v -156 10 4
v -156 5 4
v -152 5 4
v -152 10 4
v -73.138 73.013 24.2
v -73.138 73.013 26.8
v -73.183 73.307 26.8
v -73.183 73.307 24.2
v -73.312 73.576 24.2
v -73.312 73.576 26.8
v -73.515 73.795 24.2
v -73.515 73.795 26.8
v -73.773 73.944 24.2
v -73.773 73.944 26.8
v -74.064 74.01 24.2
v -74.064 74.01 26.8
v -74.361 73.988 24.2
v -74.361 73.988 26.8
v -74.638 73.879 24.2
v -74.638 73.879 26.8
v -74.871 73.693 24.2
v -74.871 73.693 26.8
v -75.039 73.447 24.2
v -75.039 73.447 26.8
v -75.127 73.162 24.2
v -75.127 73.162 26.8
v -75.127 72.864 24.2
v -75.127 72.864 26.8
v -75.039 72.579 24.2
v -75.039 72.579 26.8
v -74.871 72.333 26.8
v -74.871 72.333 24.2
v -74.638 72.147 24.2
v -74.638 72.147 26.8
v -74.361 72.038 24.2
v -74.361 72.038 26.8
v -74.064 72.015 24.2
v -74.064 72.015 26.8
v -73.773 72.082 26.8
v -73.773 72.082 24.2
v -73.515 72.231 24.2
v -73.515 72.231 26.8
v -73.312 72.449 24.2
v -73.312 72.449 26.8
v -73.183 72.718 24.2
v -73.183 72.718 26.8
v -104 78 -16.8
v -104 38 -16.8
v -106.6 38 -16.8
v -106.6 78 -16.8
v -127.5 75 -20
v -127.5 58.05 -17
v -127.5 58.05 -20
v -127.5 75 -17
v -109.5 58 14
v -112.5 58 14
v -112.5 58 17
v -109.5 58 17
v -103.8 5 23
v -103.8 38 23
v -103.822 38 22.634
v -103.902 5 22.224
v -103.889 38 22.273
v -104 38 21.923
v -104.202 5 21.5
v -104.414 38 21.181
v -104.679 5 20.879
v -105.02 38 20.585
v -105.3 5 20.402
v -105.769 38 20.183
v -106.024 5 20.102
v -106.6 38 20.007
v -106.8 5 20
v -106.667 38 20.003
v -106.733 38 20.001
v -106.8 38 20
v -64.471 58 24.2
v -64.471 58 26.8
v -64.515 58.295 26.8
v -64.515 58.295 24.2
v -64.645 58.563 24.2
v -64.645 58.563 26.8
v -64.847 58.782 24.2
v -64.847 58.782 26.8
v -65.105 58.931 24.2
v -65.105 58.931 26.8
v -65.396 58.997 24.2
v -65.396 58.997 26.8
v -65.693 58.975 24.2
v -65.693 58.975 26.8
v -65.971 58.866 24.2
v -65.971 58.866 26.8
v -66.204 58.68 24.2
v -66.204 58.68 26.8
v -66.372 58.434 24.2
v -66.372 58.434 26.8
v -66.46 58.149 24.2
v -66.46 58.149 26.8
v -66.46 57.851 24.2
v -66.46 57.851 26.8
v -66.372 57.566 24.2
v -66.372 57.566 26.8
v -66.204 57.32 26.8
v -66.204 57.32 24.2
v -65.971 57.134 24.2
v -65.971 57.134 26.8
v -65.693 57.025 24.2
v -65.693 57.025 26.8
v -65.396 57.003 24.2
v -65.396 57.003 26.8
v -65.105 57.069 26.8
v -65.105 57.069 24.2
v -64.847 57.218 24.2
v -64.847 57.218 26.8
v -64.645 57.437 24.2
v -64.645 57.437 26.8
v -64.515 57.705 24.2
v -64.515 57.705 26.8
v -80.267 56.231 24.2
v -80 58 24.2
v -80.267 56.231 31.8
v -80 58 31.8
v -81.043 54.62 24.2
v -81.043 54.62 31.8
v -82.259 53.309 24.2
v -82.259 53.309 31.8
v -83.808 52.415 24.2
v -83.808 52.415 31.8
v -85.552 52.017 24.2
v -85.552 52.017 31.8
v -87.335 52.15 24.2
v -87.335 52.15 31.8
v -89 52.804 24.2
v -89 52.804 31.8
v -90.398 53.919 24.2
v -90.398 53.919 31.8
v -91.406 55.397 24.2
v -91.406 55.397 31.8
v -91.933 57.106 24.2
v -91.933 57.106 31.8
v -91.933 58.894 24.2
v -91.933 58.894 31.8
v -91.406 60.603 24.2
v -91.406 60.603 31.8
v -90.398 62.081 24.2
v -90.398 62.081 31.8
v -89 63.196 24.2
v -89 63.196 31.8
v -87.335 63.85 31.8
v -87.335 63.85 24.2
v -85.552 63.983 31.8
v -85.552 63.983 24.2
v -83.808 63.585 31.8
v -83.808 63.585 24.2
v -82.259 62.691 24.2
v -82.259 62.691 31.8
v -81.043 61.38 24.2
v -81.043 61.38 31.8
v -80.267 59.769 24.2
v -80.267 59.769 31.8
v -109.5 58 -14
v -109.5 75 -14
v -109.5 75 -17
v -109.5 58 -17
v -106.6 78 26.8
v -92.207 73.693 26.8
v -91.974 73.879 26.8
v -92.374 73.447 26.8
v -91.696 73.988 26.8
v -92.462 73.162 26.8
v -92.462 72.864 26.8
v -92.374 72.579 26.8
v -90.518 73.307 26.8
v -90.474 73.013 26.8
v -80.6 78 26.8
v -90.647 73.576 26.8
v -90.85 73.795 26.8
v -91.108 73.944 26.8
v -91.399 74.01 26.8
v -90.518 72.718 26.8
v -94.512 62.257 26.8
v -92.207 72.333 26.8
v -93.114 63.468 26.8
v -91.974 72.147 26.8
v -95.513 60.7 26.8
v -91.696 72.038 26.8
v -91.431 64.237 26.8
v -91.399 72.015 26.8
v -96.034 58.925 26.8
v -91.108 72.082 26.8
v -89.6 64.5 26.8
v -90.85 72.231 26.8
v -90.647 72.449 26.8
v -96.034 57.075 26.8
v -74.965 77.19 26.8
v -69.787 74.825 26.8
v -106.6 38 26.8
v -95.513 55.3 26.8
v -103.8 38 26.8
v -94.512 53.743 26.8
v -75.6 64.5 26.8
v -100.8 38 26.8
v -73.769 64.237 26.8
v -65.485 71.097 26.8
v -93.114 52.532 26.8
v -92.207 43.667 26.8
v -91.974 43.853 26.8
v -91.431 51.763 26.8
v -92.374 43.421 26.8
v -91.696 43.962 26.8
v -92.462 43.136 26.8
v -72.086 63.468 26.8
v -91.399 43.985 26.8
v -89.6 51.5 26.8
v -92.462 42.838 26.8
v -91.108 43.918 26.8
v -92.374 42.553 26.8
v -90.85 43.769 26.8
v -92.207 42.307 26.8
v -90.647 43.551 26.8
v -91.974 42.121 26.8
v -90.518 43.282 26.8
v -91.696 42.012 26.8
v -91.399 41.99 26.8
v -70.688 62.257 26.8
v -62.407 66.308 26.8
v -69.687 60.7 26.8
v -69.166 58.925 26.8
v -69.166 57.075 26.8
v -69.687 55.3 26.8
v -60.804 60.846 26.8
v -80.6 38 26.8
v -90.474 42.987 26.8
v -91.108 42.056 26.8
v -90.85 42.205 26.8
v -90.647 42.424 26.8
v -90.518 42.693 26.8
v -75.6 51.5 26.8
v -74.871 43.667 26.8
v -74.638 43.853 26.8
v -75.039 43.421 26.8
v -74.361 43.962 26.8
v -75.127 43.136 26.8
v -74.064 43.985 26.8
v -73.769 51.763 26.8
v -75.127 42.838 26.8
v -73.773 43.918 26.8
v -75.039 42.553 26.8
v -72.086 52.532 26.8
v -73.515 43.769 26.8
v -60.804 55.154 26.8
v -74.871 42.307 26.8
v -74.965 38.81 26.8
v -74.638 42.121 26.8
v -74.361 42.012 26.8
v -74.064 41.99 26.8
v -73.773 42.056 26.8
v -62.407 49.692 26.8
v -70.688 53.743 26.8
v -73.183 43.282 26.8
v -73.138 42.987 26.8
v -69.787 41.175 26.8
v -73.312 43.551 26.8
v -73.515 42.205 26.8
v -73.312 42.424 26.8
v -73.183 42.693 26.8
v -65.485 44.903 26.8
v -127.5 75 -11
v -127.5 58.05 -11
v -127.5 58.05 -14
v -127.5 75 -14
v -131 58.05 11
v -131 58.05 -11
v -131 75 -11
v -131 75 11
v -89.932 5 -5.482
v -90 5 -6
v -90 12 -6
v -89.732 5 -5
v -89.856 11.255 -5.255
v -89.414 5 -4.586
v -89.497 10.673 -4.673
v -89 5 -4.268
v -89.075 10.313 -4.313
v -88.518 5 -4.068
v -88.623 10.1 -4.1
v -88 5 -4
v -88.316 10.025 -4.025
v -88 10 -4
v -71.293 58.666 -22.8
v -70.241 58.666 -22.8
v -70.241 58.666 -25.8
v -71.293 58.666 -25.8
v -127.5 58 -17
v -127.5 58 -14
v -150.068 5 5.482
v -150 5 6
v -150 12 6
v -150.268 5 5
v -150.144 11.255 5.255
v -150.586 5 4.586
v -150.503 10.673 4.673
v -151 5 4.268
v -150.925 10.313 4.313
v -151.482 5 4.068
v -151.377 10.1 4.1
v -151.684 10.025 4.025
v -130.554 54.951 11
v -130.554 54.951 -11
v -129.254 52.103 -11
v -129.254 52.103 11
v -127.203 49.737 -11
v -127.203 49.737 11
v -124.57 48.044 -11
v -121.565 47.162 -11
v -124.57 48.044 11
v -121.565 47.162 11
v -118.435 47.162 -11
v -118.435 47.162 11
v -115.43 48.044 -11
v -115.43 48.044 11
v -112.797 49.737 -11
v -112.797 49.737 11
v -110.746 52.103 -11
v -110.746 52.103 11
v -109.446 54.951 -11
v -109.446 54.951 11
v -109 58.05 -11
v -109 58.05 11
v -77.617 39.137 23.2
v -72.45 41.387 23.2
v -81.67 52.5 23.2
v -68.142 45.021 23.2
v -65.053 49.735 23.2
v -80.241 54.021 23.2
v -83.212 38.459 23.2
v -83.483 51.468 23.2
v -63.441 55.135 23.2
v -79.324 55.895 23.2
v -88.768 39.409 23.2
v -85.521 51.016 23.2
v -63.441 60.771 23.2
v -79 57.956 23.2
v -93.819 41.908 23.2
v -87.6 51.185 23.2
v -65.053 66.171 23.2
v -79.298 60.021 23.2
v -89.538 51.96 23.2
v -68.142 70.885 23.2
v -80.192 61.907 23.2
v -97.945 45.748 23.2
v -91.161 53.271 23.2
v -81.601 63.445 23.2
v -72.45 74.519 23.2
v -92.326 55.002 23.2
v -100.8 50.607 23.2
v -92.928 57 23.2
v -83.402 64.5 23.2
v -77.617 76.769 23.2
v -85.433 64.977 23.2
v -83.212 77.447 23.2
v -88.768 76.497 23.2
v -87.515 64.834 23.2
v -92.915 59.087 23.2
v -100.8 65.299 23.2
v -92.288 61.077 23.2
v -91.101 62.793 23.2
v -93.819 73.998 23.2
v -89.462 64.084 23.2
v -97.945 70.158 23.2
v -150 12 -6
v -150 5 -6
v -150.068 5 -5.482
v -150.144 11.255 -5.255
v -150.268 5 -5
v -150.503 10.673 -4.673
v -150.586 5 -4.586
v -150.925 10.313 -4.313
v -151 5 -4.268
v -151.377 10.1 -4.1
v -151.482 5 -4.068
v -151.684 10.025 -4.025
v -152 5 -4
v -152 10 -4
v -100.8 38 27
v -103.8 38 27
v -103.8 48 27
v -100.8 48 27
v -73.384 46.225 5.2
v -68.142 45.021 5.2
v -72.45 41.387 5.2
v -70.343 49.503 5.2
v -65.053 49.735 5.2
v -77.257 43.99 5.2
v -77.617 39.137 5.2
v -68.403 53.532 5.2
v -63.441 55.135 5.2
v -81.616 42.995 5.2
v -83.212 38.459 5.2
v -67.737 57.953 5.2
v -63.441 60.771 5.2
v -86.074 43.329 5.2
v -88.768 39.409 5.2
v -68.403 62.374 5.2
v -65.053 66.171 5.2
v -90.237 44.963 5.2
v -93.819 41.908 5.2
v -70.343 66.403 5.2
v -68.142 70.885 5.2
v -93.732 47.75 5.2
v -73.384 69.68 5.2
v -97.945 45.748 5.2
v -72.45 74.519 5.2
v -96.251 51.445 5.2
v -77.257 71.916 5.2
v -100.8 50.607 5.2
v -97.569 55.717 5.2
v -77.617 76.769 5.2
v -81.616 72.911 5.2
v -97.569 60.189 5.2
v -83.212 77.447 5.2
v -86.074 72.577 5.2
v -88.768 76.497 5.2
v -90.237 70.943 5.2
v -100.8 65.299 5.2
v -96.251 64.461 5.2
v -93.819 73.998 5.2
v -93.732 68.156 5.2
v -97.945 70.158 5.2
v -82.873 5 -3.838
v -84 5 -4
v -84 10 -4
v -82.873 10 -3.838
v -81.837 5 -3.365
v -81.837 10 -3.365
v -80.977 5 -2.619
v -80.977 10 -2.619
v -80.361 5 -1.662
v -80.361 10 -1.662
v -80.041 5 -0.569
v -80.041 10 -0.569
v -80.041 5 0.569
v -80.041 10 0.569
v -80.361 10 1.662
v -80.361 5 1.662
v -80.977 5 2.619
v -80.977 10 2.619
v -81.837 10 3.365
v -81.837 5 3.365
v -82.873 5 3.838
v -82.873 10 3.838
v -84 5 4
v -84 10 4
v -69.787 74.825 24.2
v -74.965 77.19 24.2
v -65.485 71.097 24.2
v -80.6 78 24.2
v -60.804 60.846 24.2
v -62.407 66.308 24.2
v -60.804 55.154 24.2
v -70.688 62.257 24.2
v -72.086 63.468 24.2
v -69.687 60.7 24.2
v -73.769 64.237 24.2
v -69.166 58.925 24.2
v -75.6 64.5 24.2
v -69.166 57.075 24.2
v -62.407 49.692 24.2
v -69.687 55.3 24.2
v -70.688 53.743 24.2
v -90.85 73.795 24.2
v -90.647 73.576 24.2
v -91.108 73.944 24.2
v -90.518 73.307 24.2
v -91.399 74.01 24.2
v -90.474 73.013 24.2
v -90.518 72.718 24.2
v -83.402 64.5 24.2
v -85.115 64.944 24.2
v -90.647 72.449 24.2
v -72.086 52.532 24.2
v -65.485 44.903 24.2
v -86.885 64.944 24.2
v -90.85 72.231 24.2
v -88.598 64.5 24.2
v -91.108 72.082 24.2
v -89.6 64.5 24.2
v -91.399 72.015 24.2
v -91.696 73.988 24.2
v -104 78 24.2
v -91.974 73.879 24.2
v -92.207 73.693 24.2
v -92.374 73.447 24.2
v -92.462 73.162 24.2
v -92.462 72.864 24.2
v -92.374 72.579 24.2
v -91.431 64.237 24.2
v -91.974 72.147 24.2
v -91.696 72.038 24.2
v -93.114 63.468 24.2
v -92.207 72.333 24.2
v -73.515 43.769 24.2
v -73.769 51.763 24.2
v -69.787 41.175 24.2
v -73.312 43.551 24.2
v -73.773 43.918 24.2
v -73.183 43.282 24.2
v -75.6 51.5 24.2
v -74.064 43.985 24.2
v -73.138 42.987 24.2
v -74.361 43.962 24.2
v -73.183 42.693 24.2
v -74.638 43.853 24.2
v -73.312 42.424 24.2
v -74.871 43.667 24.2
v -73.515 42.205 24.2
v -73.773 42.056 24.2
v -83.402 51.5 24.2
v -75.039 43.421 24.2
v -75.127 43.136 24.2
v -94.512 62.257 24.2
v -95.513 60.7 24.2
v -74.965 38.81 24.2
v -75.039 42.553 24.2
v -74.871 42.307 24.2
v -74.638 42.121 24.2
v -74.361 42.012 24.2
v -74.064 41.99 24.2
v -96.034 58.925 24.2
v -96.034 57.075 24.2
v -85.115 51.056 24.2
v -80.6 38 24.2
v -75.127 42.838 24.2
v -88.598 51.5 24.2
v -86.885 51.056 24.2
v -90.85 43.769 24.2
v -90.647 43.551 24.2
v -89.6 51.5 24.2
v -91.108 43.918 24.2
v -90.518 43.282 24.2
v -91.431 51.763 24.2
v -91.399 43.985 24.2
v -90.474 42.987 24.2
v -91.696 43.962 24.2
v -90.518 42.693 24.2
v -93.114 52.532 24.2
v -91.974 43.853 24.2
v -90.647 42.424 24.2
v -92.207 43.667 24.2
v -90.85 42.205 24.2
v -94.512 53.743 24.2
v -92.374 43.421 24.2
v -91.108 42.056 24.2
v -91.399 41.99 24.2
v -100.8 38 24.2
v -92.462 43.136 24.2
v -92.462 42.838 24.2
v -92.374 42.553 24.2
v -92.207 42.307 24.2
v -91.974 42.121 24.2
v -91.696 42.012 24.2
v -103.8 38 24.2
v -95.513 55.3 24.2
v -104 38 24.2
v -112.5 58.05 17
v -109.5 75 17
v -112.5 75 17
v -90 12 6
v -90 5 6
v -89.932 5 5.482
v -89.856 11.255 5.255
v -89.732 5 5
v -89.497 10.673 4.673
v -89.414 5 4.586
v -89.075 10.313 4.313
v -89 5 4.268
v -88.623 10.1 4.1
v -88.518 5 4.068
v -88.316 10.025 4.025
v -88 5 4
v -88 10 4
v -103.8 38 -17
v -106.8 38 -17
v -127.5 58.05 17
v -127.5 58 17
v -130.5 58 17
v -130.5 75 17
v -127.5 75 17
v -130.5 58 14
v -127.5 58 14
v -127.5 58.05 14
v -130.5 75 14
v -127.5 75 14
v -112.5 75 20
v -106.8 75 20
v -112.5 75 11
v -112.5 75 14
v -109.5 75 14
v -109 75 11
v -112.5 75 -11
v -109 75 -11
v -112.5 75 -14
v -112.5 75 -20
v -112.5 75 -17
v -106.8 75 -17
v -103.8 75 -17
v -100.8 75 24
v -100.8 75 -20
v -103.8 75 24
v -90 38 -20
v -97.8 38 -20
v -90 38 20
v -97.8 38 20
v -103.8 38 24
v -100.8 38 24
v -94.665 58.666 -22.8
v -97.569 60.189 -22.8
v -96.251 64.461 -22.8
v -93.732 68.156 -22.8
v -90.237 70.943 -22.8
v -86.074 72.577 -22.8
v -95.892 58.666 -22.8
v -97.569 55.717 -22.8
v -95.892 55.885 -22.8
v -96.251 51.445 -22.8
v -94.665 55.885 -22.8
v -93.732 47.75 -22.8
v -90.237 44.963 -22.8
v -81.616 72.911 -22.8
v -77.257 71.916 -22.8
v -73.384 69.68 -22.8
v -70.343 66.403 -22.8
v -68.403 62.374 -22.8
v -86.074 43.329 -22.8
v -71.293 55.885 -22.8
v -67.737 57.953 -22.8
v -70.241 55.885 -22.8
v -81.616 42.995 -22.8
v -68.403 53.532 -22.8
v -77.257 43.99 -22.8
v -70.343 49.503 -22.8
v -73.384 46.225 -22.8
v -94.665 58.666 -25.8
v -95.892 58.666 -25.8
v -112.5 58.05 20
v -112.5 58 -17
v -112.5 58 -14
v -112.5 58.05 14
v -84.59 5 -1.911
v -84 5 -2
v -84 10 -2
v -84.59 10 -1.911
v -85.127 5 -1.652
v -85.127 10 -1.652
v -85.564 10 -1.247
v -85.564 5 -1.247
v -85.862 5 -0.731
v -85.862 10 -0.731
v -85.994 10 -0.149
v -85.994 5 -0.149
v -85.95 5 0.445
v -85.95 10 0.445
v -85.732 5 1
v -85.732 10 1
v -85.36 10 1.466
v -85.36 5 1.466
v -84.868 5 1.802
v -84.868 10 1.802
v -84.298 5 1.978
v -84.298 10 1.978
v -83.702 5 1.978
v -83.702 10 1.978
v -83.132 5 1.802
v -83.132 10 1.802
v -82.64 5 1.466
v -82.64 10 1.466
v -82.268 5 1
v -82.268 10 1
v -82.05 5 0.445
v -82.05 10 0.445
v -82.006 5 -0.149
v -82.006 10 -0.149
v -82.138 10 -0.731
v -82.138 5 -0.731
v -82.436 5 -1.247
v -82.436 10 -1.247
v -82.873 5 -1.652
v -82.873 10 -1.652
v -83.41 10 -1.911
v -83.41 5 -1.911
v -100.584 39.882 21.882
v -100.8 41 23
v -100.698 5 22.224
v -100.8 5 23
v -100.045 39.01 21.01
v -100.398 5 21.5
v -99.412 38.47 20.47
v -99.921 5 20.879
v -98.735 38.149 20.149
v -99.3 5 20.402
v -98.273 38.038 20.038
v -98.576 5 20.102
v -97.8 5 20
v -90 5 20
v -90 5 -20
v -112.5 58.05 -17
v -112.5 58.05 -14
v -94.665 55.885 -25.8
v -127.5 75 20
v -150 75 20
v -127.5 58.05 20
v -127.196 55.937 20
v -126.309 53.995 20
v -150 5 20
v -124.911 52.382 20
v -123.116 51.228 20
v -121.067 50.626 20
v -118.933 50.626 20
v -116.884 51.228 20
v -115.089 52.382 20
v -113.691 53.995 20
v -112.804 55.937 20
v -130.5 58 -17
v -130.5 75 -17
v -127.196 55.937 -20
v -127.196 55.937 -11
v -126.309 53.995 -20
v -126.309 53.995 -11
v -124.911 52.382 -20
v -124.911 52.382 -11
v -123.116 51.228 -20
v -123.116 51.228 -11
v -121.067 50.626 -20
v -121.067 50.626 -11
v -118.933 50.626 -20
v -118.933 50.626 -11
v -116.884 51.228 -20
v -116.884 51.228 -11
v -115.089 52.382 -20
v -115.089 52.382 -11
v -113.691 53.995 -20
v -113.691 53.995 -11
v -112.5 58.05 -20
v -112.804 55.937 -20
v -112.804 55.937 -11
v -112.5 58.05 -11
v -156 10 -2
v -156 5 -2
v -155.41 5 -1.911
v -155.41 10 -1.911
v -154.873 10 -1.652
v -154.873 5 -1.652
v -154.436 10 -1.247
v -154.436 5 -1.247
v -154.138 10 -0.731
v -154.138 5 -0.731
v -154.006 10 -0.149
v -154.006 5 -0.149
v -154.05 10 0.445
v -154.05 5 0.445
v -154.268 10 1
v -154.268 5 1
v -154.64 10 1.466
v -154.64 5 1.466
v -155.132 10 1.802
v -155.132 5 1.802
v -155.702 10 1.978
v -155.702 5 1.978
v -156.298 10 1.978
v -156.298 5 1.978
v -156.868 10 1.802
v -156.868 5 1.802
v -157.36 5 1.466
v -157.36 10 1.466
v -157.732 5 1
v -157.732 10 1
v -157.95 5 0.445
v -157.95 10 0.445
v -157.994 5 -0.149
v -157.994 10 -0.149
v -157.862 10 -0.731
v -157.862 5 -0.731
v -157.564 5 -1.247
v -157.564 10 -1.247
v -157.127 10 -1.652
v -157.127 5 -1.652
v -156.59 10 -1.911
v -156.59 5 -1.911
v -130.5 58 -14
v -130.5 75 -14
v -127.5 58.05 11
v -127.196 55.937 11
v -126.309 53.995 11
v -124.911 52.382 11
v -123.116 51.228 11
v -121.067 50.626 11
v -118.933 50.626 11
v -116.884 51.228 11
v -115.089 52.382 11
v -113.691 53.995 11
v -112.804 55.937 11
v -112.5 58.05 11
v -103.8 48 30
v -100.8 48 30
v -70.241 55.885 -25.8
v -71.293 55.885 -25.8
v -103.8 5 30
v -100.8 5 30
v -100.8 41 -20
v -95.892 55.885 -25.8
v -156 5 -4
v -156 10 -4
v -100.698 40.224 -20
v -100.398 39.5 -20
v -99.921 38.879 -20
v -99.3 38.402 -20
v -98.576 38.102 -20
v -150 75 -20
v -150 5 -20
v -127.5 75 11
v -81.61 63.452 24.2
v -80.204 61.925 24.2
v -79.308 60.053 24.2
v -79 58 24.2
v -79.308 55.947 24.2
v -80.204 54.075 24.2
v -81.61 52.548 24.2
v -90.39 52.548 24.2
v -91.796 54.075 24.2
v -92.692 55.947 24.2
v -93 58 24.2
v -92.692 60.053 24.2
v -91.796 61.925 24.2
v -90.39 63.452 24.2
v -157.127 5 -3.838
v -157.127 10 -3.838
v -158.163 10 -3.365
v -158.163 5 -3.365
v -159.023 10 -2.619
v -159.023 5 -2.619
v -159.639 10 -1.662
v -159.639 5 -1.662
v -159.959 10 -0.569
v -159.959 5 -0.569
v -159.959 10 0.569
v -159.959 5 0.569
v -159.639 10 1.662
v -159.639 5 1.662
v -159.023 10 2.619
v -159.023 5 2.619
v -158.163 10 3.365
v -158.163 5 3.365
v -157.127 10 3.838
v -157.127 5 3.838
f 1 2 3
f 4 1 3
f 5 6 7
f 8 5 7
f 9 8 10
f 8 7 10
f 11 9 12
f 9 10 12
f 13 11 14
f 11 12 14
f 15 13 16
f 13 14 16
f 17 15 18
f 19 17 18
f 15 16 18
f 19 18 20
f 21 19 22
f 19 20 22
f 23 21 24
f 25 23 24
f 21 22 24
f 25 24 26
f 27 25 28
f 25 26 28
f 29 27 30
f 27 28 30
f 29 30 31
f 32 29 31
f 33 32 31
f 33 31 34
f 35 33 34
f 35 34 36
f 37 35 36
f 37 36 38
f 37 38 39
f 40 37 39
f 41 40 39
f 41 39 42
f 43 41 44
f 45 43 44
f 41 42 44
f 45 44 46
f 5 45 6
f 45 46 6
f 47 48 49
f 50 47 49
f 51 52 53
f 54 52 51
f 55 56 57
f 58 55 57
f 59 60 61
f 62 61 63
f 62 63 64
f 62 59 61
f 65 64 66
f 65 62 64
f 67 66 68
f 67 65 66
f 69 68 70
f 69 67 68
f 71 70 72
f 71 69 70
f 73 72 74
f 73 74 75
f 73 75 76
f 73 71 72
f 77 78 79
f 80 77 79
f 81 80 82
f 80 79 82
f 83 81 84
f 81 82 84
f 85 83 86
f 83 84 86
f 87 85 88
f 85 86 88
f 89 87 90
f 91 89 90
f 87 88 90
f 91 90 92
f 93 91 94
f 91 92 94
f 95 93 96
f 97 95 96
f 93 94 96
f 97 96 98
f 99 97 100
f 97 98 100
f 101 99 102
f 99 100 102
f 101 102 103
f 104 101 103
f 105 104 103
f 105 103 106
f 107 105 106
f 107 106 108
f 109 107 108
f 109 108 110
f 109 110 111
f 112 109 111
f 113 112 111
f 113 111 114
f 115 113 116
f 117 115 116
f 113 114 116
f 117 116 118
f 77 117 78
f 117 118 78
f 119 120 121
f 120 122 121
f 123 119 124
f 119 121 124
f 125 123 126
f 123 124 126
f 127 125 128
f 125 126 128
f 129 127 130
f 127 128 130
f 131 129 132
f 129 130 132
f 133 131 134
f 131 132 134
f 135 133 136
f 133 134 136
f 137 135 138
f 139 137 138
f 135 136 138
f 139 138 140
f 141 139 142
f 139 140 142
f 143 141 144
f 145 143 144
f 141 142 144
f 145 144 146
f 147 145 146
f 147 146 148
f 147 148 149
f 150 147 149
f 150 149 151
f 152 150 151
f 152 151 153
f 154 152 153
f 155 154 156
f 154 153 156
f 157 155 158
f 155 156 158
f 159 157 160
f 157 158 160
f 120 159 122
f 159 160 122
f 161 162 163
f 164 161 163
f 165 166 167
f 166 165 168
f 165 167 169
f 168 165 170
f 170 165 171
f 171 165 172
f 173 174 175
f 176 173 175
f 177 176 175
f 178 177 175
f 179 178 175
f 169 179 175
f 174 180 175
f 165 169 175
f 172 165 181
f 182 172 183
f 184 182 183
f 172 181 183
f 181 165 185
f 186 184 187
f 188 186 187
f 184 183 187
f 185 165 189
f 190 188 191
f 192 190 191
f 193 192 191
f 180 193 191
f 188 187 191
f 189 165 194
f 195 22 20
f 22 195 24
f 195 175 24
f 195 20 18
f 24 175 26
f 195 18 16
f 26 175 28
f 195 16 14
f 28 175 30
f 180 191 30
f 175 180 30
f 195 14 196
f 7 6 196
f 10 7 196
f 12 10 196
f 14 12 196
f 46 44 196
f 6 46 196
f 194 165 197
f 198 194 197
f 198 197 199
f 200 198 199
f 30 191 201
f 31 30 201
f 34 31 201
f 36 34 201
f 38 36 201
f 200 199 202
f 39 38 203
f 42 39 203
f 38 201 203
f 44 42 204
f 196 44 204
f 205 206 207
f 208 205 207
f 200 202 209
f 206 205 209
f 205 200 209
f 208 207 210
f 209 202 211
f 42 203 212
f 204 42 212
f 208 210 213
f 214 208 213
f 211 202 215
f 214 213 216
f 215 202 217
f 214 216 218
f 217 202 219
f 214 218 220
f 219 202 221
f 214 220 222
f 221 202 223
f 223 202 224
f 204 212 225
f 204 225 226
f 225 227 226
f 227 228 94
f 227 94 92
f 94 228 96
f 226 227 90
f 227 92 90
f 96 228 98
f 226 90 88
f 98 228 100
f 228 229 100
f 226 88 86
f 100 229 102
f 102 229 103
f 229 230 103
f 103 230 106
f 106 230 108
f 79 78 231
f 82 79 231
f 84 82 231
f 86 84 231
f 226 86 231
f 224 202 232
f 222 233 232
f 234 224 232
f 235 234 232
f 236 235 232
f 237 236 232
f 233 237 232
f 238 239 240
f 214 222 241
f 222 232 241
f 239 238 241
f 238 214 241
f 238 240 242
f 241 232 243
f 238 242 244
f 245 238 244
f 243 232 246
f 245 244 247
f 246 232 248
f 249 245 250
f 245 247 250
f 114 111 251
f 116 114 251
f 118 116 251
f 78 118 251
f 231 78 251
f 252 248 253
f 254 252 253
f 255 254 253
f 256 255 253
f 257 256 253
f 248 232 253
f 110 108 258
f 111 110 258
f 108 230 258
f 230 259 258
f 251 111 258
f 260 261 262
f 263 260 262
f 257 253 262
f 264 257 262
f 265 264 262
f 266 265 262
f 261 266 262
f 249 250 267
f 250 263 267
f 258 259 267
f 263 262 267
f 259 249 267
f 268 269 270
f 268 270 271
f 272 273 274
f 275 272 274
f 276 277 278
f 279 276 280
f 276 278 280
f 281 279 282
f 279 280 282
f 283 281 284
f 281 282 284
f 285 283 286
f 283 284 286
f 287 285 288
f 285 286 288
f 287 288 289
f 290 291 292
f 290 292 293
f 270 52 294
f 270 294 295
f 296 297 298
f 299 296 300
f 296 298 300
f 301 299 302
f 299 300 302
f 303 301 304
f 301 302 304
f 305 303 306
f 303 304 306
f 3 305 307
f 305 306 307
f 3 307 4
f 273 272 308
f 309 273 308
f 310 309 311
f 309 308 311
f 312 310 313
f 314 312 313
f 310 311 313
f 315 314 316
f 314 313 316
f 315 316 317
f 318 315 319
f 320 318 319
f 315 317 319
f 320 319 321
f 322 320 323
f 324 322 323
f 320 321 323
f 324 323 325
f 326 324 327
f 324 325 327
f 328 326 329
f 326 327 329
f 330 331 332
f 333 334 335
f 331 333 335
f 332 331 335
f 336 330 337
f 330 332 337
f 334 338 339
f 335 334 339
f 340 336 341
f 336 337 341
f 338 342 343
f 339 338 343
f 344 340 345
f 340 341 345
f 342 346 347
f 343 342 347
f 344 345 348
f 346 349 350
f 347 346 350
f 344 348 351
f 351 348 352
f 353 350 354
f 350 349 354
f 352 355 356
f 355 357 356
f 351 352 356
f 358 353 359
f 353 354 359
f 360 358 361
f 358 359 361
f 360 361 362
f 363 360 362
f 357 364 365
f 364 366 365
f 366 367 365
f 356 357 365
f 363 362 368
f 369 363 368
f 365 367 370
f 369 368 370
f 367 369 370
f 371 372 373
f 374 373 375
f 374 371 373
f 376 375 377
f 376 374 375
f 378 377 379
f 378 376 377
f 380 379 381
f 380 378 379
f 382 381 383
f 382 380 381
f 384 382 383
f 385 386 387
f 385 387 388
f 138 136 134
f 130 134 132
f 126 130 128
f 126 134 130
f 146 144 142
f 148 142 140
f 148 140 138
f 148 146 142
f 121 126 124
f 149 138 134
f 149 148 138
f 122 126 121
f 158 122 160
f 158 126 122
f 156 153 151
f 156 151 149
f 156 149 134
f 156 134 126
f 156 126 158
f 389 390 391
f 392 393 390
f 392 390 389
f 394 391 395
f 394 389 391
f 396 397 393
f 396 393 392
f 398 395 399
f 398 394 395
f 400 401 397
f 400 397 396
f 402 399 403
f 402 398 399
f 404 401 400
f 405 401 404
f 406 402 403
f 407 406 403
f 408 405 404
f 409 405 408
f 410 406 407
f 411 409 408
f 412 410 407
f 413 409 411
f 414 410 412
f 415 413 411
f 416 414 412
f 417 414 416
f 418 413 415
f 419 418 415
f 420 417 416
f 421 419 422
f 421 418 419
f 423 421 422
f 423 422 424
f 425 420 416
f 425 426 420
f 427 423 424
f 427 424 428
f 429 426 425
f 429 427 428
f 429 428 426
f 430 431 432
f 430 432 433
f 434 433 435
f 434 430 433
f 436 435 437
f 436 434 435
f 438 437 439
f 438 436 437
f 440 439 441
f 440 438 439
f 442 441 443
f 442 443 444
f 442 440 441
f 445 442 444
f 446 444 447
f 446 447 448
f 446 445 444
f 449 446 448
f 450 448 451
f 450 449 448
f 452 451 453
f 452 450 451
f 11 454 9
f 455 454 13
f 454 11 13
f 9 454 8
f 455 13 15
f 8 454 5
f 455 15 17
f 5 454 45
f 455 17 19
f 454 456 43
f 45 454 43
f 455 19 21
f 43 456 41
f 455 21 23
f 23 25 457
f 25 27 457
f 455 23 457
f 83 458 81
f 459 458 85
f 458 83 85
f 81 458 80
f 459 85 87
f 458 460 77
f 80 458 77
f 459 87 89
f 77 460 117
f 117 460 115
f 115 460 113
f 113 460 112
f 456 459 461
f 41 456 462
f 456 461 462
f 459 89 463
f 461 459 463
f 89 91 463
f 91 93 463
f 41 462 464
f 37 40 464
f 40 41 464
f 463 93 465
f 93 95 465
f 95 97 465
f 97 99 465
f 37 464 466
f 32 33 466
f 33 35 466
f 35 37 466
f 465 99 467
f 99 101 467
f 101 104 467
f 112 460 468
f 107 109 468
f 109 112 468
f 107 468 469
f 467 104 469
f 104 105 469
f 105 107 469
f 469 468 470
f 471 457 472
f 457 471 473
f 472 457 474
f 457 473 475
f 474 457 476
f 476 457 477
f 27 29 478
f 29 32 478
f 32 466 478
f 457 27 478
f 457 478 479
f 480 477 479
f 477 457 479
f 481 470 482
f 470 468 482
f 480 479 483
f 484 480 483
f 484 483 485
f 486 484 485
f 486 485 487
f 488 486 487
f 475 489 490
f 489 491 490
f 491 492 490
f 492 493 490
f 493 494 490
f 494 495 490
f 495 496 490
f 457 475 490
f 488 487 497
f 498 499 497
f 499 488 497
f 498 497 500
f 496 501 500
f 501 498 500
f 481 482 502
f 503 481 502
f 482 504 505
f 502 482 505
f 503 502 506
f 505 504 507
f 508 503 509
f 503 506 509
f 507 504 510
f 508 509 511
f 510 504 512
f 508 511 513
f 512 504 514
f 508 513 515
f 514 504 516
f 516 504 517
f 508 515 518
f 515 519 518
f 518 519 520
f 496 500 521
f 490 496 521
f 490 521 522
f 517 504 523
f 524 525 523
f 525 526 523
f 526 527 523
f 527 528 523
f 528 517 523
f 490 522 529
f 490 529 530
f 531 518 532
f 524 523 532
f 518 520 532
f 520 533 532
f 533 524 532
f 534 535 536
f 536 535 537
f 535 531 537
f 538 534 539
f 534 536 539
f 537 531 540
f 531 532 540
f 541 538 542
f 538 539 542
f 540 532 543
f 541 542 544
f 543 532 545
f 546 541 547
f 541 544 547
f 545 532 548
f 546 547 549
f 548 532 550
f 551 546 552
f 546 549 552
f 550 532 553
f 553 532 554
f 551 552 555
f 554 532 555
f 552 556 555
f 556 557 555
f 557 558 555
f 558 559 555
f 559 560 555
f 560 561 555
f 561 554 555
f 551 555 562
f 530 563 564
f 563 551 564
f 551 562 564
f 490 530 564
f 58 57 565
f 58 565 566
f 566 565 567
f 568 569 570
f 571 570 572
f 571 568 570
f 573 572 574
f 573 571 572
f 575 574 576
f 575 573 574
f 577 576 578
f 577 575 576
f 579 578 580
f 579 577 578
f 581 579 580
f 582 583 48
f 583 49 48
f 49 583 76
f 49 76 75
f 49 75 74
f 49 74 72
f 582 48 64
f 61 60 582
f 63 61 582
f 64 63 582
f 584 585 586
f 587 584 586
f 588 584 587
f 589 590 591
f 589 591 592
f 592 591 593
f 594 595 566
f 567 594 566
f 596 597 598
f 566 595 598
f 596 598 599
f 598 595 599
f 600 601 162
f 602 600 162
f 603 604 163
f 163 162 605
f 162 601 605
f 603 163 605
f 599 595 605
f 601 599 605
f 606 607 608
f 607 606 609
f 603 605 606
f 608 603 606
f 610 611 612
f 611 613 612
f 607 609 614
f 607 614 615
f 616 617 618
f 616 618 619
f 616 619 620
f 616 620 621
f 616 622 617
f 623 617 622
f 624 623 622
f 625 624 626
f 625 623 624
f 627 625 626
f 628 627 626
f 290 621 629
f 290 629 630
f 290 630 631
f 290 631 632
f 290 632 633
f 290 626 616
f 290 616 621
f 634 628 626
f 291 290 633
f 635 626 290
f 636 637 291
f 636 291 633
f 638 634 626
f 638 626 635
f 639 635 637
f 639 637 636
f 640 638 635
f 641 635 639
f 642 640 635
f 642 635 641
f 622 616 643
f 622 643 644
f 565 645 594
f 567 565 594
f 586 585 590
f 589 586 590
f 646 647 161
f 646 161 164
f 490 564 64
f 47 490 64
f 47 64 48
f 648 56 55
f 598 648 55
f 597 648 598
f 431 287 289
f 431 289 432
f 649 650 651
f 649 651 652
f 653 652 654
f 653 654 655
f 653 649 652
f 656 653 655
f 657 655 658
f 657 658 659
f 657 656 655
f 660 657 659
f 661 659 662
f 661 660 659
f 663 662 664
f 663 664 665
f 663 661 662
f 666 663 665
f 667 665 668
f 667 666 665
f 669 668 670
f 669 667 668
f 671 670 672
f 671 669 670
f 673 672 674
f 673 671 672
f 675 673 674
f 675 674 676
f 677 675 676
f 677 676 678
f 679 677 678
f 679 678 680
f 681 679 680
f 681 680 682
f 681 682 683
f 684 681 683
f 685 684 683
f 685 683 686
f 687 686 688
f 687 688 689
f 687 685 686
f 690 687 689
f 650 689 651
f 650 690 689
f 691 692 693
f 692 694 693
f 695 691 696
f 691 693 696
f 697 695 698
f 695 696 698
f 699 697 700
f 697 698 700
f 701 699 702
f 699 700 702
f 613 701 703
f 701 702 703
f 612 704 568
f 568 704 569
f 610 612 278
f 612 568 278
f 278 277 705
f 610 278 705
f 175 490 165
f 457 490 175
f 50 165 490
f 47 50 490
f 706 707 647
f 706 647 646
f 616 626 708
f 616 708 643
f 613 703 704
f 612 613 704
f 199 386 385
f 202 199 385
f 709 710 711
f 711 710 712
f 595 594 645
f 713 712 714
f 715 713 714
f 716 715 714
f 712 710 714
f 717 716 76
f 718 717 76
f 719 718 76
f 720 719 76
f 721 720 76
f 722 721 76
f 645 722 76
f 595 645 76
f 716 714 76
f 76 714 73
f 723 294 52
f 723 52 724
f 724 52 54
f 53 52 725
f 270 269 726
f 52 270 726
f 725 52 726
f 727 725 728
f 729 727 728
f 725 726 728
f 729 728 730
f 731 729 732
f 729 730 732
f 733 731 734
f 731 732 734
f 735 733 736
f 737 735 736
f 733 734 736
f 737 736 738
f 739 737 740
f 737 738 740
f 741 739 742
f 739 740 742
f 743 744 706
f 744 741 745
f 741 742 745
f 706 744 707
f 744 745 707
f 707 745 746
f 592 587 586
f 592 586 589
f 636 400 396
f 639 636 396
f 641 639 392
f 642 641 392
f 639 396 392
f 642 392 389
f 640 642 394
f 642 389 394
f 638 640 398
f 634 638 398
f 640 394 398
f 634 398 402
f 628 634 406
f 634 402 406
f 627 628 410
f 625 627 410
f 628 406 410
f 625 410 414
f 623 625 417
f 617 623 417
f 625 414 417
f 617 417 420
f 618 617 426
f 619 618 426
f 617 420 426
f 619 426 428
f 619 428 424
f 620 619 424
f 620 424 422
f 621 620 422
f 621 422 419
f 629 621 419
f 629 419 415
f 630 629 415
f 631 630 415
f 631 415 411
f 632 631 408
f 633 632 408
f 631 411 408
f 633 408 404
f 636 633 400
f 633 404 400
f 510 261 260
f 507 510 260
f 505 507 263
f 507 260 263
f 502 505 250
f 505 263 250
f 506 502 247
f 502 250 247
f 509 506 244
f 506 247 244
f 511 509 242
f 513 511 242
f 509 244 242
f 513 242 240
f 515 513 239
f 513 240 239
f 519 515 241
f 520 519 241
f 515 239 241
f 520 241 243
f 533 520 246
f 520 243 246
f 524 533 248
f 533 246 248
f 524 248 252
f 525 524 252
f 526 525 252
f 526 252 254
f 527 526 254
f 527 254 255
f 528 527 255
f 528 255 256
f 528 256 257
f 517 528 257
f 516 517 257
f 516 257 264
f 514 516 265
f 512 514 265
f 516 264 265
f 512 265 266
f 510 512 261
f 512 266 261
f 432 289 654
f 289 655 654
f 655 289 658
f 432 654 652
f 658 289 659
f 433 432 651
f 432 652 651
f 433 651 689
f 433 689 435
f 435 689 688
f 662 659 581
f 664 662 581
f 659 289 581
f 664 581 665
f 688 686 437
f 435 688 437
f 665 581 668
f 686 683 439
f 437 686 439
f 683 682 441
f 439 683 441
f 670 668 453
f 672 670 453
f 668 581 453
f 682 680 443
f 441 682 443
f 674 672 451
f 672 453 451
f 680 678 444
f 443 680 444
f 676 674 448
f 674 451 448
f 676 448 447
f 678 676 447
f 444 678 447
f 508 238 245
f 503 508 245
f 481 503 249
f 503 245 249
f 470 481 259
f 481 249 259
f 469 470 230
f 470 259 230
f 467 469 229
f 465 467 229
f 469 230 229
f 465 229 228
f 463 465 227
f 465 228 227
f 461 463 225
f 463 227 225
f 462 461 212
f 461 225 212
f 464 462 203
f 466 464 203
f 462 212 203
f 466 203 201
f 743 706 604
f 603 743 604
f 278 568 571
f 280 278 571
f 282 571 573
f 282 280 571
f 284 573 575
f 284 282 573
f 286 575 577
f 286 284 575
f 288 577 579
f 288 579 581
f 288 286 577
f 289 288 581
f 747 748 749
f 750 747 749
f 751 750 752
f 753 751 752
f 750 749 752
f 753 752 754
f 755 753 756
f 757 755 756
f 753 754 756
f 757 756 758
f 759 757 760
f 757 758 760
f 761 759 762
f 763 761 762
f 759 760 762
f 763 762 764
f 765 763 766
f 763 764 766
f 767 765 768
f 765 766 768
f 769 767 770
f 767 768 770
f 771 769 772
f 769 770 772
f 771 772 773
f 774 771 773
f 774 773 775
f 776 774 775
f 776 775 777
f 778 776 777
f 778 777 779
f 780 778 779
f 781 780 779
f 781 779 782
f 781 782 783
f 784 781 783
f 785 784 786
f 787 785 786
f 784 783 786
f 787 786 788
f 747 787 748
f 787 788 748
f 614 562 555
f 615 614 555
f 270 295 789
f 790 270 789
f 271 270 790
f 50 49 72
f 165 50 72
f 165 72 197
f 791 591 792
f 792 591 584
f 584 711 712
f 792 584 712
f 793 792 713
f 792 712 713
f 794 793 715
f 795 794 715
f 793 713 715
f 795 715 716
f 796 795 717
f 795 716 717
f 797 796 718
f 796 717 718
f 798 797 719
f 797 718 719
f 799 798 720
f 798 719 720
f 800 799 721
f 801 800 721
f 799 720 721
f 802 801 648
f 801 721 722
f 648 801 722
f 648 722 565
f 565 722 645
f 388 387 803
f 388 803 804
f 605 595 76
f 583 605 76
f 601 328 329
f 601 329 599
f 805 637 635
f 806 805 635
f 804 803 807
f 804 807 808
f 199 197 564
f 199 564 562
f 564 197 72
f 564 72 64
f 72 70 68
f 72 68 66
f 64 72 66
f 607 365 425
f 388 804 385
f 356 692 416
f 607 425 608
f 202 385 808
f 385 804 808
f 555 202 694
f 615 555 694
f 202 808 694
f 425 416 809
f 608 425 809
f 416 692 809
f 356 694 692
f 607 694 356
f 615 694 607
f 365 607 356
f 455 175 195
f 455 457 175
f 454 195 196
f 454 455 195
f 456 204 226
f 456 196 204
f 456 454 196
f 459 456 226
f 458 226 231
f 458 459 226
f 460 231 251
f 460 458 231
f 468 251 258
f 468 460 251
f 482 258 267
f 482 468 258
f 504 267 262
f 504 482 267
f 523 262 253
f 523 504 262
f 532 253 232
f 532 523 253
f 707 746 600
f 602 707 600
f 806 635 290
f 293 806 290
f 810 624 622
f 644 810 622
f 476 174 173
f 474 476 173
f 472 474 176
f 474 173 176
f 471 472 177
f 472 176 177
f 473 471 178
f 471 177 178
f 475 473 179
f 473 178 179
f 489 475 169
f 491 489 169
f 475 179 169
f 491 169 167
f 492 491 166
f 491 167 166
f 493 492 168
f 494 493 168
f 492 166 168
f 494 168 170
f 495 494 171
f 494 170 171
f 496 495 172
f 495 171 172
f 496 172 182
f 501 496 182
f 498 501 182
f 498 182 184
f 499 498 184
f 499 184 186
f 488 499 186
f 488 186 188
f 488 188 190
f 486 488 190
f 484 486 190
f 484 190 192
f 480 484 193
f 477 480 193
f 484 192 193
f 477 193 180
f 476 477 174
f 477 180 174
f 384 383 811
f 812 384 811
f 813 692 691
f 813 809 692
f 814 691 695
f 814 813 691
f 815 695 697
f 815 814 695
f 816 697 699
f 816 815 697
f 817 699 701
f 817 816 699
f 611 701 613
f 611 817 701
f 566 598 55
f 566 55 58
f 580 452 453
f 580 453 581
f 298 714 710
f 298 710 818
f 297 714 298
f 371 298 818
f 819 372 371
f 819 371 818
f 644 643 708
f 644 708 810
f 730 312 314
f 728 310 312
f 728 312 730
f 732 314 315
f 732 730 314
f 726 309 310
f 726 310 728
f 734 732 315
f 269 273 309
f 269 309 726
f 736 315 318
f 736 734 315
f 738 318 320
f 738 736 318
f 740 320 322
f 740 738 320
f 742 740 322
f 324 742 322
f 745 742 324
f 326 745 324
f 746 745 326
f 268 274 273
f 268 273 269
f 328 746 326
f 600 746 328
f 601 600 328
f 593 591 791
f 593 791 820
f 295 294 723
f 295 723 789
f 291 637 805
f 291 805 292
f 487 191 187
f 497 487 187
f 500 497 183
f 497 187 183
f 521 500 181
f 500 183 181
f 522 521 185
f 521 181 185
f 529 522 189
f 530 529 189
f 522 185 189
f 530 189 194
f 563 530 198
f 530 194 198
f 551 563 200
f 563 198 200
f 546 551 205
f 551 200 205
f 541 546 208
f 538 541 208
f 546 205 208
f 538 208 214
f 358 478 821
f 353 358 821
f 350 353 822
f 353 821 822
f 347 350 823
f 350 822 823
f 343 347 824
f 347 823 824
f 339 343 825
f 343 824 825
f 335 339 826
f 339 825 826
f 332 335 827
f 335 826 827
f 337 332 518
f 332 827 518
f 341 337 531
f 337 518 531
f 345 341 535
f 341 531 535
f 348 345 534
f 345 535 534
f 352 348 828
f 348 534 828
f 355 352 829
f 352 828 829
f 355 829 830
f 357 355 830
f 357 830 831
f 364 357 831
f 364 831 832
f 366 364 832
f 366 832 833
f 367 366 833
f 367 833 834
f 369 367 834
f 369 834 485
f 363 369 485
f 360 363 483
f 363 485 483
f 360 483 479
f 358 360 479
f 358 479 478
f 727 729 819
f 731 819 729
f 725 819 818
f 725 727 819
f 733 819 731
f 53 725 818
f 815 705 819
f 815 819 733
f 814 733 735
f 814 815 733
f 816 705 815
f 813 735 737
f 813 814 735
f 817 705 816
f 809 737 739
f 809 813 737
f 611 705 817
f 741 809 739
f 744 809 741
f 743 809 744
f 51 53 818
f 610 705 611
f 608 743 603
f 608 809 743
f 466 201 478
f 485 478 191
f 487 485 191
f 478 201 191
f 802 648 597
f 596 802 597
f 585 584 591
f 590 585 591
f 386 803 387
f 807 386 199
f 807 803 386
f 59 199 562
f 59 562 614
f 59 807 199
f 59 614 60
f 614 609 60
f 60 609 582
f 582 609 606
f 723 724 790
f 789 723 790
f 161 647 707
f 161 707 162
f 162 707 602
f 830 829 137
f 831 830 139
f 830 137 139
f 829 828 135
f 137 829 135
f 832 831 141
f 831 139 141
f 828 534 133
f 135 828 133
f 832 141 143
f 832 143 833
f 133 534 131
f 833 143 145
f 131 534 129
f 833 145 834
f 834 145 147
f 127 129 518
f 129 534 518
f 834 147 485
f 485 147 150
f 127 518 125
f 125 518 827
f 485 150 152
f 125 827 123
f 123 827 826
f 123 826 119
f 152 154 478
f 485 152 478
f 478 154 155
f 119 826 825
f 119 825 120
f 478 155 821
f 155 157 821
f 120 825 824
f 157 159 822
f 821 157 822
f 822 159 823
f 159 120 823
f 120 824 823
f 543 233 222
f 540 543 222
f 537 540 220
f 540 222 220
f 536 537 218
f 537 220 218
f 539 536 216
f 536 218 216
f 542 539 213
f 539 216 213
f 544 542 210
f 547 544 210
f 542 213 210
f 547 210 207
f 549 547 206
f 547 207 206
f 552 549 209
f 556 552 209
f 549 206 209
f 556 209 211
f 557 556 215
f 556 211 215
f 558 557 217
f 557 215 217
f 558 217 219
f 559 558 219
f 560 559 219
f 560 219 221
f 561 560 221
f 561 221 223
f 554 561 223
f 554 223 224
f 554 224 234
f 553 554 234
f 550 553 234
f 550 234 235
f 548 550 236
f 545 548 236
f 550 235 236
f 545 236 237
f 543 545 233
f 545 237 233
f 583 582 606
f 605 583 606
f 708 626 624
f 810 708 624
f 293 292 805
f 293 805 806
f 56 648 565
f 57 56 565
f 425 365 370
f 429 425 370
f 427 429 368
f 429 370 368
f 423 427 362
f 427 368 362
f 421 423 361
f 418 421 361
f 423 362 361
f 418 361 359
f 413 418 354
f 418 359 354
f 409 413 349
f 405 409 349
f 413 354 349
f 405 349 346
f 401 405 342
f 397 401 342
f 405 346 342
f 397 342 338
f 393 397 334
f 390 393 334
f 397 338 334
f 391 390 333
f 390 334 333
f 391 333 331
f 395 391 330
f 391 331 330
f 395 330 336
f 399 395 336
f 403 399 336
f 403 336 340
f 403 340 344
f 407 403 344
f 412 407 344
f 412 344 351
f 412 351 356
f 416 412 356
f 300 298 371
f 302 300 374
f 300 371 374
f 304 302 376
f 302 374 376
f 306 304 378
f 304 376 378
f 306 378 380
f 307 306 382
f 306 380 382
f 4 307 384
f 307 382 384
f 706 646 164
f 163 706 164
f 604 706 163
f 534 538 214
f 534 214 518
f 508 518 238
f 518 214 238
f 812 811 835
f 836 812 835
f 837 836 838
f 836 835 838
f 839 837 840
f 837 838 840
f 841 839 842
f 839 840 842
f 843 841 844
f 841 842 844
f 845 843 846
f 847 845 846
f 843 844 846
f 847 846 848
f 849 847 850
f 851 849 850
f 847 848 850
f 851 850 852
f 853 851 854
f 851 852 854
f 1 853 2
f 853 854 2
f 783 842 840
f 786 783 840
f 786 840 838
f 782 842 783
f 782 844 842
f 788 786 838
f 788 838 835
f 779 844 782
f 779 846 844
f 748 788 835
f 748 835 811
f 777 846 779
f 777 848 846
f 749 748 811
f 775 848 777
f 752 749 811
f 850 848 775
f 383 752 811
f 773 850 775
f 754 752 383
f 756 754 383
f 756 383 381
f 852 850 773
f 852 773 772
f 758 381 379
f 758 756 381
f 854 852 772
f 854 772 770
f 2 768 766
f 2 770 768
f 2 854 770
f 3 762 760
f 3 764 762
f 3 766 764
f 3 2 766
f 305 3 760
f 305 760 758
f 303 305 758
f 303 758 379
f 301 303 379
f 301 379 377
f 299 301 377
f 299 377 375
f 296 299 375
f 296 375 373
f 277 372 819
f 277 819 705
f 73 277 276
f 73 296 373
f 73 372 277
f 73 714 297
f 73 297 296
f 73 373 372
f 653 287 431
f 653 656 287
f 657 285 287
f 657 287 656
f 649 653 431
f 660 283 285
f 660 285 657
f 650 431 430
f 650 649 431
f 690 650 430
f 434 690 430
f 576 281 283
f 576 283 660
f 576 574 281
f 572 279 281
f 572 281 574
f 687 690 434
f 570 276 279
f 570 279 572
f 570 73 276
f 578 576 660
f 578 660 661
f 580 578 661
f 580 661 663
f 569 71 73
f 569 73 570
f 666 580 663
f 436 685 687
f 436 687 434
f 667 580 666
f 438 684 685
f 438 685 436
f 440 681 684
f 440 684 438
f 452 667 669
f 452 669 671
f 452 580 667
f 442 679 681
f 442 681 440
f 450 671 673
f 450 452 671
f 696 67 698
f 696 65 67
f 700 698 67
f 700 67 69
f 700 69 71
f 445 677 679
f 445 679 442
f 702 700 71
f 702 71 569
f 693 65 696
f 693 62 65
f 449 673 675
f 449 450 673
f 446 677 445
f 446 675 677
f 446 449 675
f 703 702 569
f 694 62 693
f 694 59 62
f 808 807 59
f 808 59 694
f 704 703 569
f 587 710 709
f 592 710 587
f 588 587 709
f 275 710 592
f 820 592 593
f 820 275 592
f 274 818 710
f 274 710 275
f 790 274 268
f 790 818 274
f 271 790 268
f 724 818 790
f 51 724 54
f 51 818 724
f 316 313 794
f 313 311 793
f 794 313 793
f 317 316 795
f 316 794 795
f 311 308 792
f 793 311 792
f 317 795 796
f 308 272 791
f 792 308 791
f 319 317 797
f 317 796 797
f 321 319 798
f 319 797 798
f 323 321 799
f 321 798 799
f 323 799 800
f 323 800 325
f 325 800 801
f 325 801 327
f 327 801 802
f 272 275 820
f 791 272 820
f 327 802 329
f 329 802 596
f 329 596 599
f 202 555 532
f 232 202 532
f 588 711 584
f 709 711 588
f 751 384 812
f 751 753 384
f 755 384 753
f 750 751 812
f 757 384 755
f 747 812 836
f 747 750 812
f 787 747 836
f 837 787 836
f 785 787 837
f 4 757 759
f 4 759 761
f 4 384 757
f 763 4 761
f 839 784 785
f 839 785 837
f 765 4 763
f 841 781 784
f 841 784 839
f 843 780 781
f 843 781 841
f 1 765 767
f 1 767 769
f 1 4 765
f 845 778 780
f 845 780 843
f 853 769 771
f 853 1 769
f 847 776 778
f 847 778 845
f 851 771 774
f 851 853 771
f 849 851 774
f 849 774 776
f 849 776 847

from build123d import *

# Parameters (mm, degrees)
SKETCH1_W       = 60
SKETCH1_H       = 40
EXTRUDE1_DEPTH  = 70
EXTRUDE2_DEPTH  = 173.409396496
SKETCH5_R       = 7.5
EXTRUDE3_DEPTH  = 173.409396496
SKETCH8_R       = 11
EXTRUDE5_DEPTH  = 11
SKETCH9_W       = 15
SKETCH9_H       = 16.95
EXTRUDE6_DEPTH  = 173.409396496
SKETCH10_W      = 22
SKETCH10_H      = 31.344818361
EXTRUDE7_DEPTH  = 11
SKETCH13_W      = 3
SKETCH13_H      = 17
EXTRUDE9_DEPTH  = 3
SKETCH14_W      = 3
SKETCH14_H      = 17
EXTRUDE10_DEPTH = 3
SKETCH16_W      = 3
SKETCH16_H      = 37
EXTRUDE11_DEPTH = 41
SKETCH17_W      = 3
SKETCH17_H      = 37
EXTRUDE12_DEPTH = 6
SKETCH18_W      = 3
SKETCH18_H      = 10
EXTRUDE13_DEPTH = 33
SKETCH19_W      = 3
SKETCH19_H      = 3
EXTRUDE14_DEPTH = 10
FILLET1_R       = 3
SKETCH20_R      = 2
EXTRUDE15_DEPTH = 5
FILLET2_R       = 2
FILLET3_R       = 2
EXTRUDE16_DEPTH = 40
FILLET4_RADIUS  = 20
FILLET4_LENGTH  = 2.6
EXTRUDE17_DEPTH = 2.6
SKETCH24_R      = 1
EXTRUDE18_DEPTH = 2.6
SKETCH25_R      = 2.5
EXTRUDE19_DEPTH = 2.6
SKETCH26_R      = 6
EXTRUDE20_DEPTH = 5
SKETCH27_R      = 6
EXTRUDE21_DEPTH = 2.6
SKETCH28_R      = 7
EXTRUDE22_DEPTH = 1
SKETCH29_R      = 19.5
EXTRUDE23_DEPTH = 18
SKETCH30_R      = 15
EXTRUDE24_DEPTH = 28
SKETCH31_W      = 1.052605107
SKETCH31_H      = 2.780967683
SKETCH31_W_2    = 1.226574425
EXTRUDE25_DEPTH = 3


with BuildPart() as part:
    # Sketch1 → Extrude1 (new body)
    with BuildSketch(Plane(origin=(0, 5, 0), x_dir=(1, 0, 0), z_dir=(0, 1, 0))):
        with Locations((-120, 0)):
            Rectangle(SKETCH1_W, SKETCH1_H)
    extrude(amount=EXTRUDE1_DEPTH)

    # Sketch4 → Extrude2 (cut, through all)
    with BuildSketch(Plane.XY.offset(20)):
        Polygon((-106.8, 75), (-106.8, 38), (-69.340811885, 38), (-69.340811885, 101.678315396), (-106.8, 101.678315396), align=None)
    extrude(amount=-EXTRUDE2_DEPTH, mode=Mode.SUBTRACT)

    # Sketch5 → Extrude3 (cut, through all)
    with BuildSketch(Plane.XY.offset(20)):
        with Locations((-120, 58.05)):
            Circle(SKETCH5_R)
    extrude(amount=-EXTRUDE3_DEPTH, mode=Mode.SUBTRACT)

    # Sketch8 → Extrude5 (cut, symmetric)
    with BuildSketch(Plane.XY):
        with Locations((-120, 58.05)):
            Circle(SKETCH8_R)
    extrude(amount=EXTRUDE5_DEPTH, both=True, mode=Mode.SUBTRACT)

    # Sketch9 → Extrude6 (cut, through all)
    with BuildSketch(Plane.XY.offset(20)):
        with Locations((-120, 66.525)):
            Rectangle(SKETCH9_W, SKETCH9_H)
    extrude(amount=-EXTRUDE6_DEPTH, mode=Mode.SUBTRACT)

    # Sketch10 → Extrude7 (cut, symmetric)
    with BuildSketch(Plane.XY):
        with Locations((-120, 73.722409181)):
            Rectangle(SKETCH10_W, SKETCH10_H)
    extrude(amount=EXTRUDE7_DEPTH, both=True, mode=Mode.SUBTRACT)

    # Sketch13 → Extrude9 (cut)
    with BuildSketch(Plane(origin=(-127.5, 0, 0), x_dir=(0, 0, -1), z_dir=(1, 0, 0))):
        with Locations((-15.5, 66.5)):
            Rectangle(SKETCH13_W, SKETCH13_H)
    extrude9 = extrude(amount=-EXTRUDE9_DEPTH, mode=Mode.SUBTRACT)

    # Sketch14 → Extrude10 (cut)
    with BuildSketch(Plane.ZY.offset(112.5)):
        with Locations((15.5, 66.5)):
            Rectangle(SKETCH14_W, SKETCH14_H)
    extrude10 = extrude(amount=-EXTRUDE10_DEPTH, mode=Mode.SUBTRACT)

    # Mirror1: Extrude9, Extrude10 across plane
    add(extrude9.mirror(Plane.XY), mode=Mode.SUBTRACT)
    add(extrude10.mirror(Plane.XY), mode=Mode.SUBTRACT)

    # Sketch16 → Extrude11 (add)
    with BuildSketch(Plane.XY.offset(-17)):
        with Locations((-102.3, 56.5)):
            Rectangle(SKETCH16_W, SKETCH16_H)
    extrude(amount=EXTRUDE11_DEPTH)

    # Sketch17 → Extrude12 (add)
    with BuildSketch(Plane(origin=(-100.8, 0, 0), x_dir=(0, 0, -1), z_dir=(1, 0, 0))):
        with Locations((18.5, 56.5)):
            Rectangle(SKETCH17_W, SKETCH17_H)
    extrude(amount=-EXTRUDE12_DEPTH)

    # Sketch18 → Extrude13 (add)
    with BuildSketch(Plane.XZ.offset(-38)):
        with Locations((-102.3, 25)):
            Rectangle(SKETCH18_W, SKETCH18_H)
    extrude(amount=EXTRUDE13_DEPTH)

    # Sketch19 → Extrude14 (add)
    with BuildSketch(Plane(origin=(0, 38, 0), x_dir=(1, 0, 0), z_dir=(0, 1, 0))):
        with Locations((-102.3, -28.5)):
            Rectangle(SKETCH19_W, SKETCH19_H)
    extrude(amount=EXTRUDE14_DEPTH)

    # Fillet1
    fillet1_edges = [part.edges().sort_by_distance(p)[0] for p in [
        (-100.8, 38, 0),
        (-100.8, 21.5, 20),
        (-103.8, 21.5, 20),
    ]]
    fillet(fillet1_edges, radius=FILLET1_R)

    # Sketch20 → Extrude15 (add)
    with BuildSketch(Plane.XZ.offset(-5)):
        with BuildLine():
            Line((-156, 4), (-150, 4))
            Line((-150, 4), (-150, -4))
            Line((-150, -4), (-156, -4))
            ThreePointArc((-156, -4), (-160, 0), (-156, 4))
        make_face()
        with Locations(Location((-156, 0, 0), (0, 0, 270))):
            Circle(SKETCH20_R, mode=Mode.SUBTRACT)
    extrude15 = extrude(amount=-EXTRUDE15_DEPTH)

    # Fillet2
    fillet2_edges = [part.edges().sort_by_distance(p)[0] for p in [
        (-150, 10, 0),
        (-150, 7.5, 4),
        (-150, 7.5, -4),
    ]]
    fillet(fillet2_edges, radius=FILLET2_R)

    # Mirror7: Extrude15 across plane
    add(extrude15.mirror(Plane.ZY.offset(120)))

    # Fillet3
    fillet3_edges = [part.edges().sort_by_distance(p)[0] for p in [
        (-90, 10, 0),
        (-90, 7.5, -4),
        (-90, 7.5, 4),
    ]]
    fillet(fillet3_edges, radius=FILLET3_R)

    # Sketch21 → Extrude16 (add)
    with BuildSketch(Plane(origin=(0, 38, 0), x_dir=(1, 0, 0), z_dir=(0, 1, 0))):
        Polygon((-104, -21.450806662), (-104, 16.8), (-106.6, 16.8), (-106.6, -19.806256115), (-106.6, -26.8), (-103.6, -26.8), (-101, -26.8), (-60.6, -26.8), (-60.6, -24.2), (-101, -24.2), (-103.6, -24.2), (-104, -24.2), align=None)
    extrude(amount=EXTRUDE16_DEPTH)

    # Fillet4: full round fillet: the end face becomes a half cylinder, R = half its width
    fillet4_face = Plane((-60.6, 58, 25.5), x_dir=(0, 0, -1), z_dir=(1, 0, 0))  # on the end face: x along it, z out of the body
    fillet4_slab = fillet4_face.offset(-FILLET4_RADIUS / 2) * Box(FILLET4_LENGTH, 2 * FILLET4_RADIUS, FILLET4_RADIUS, mode=Mode.PRIVATE)  # the body's end, R deep
    fillet4_round = Plane((-80.6, 58, 25.5), x_dir=(1, 0, 0), z_dir=(0, 0, -1)) * Cylinder(FILLET4_RADIUS, FILLET4_LENGTH, mode=Mode.PRIVATE)  # its axis R under the face
    add(fillet4_slab - fillet4_round, mode=Mode.SUBTRACT)

    # Sketch22 → Extrude17 (cut)
    with BuildSketch(Plane.XY.offset(26.8)):
        with BuildLine():
            Line((-89.6, 51.5), (-75.6, 51.5))
            ThreePointArc((-75.6, 51.5), (-69.1, 58), (-75.6, 64.5))
            Line((-75.6, 64.5), (-89.6, 64.5))
            ThreePointArc((-89.6, 64.5), (-96.1, 58), (-89.6, 51.5))
        make_face()
    extrude(amount=-EXTRUDE17_DEPTH, mode=Mode.SUBTRACT)

    # Sketch24 → Extrude18 (cut)
    with BuildSketch(Plane.XY.offset(26.8)):
        with Locations((-65.470800536, 58)):
            Circle(SKETCH24_R)
        with Locations((-74.138374008, 42.987322368)):
            Circle(SKETCH24_R)
        with Locations((-91.473520952, 42.987322368)):
            Circle(SKETCH24_R)
        with Locations((-100.141094423, 58)):
            Circle(SKETCH24_R)
        with Locations((-91.473520952, 73.012677632)):
            Circle(SKETCH24_R)
        with Locations((-74.138374008, 73.012677632)):
            Circle(SKETCH24_R)
    extrude(amount=-EXTRUDE18_DEPTH, mode=Mode.SUBTRACT)

    # Sketch25 → Extrude19 (add)
    with BuildSketch(Plane.XY.offset(26.8)):
        with Locations((-100.141094423, 58)):
            Circle(SKETCH25_R)
    extrude(amount=-EXTRUDE19_DEPTH)



with BuildPart() as body_2:
    # Sketch26 → Extrude20 (new body)
    with BuildSketch(Plane.XY.offset(26.8)):
        with Locations((-86, 58)):
            Circle(SKETCH26_R)
    extrude(amount=EXTRUDE20_DEPTH)

    # Sketch27 → Extrude21 (add)
    with BuildSketch(Plane(origin=(0, 0, 26.8), x_dir=(-1, 0, 0), z_dir=(0, 0, -1))):
        with Locations(Location((86, 58, 0), (0, 0, 180))):
            Circle(SKETCH27_R)
    extrude(amount=EXTRUDE21_DEPTH)


with BuildPart() as part_1:
    add(part.part)

    add(body_2.part)  # Extrude22 merges body 2
    # Sketch28 → Extrude22 (add)
    with BuildSketch(Plane(origin=(0, 0, 24.2), x_dir=(-1, 0, 0), z_dir=(0, 0, -1))):
        with Locations(Location((86, 58, 0), (0, 0, 111.786789298))):
            Circle(SKETCH28_R)
    extrude(amount=EXTRUDE22_DEPTH)

    # Sketch29 → Extrude23 (add)
    with BuildSketch(Plane(origin=(0, 0, 23.2), x_dir=(-1, 0, 0), z_dir=(0, 0, -1))):
        with Locations((82.736652481, 57.95294162)):
            Circle(SKETCH29_R)
    extrude(amount=EXTRUDE23_DEPTH)

    # Sketch30 → Extrude24 (add)
    with BuildSketch(Plane(origin=(0, 0, 5.2), x_dir=(-1, 0, 0), z_dir=(0, 0, -1))):
        with Locations(Location((82.736652481, 57.95294162, 0), (0, 0, 180))):
            Circle(SKETCH30_R)
    extrude(amount=EXTRUDE24_DEPTH)

    # Sketch31 → Extrude25 (add)
    with BuildSketch(Plane(origin=(0, 0, -22.8), x_dir=(-1, 0, 0), z_dir=(0, 0, -1))):
        with Locations((70.766955126, 57.275867088)):
            Rectangle(SKETCH31_W, SKETCH31_H)
        with Locations((95.278427538, 57.275867088)):
            Rectangle(SKETCH31_W_2, SKETCH31_H)
    extrude(amount=EXTRUDE25_DEPTH)


solid = part_1.part
